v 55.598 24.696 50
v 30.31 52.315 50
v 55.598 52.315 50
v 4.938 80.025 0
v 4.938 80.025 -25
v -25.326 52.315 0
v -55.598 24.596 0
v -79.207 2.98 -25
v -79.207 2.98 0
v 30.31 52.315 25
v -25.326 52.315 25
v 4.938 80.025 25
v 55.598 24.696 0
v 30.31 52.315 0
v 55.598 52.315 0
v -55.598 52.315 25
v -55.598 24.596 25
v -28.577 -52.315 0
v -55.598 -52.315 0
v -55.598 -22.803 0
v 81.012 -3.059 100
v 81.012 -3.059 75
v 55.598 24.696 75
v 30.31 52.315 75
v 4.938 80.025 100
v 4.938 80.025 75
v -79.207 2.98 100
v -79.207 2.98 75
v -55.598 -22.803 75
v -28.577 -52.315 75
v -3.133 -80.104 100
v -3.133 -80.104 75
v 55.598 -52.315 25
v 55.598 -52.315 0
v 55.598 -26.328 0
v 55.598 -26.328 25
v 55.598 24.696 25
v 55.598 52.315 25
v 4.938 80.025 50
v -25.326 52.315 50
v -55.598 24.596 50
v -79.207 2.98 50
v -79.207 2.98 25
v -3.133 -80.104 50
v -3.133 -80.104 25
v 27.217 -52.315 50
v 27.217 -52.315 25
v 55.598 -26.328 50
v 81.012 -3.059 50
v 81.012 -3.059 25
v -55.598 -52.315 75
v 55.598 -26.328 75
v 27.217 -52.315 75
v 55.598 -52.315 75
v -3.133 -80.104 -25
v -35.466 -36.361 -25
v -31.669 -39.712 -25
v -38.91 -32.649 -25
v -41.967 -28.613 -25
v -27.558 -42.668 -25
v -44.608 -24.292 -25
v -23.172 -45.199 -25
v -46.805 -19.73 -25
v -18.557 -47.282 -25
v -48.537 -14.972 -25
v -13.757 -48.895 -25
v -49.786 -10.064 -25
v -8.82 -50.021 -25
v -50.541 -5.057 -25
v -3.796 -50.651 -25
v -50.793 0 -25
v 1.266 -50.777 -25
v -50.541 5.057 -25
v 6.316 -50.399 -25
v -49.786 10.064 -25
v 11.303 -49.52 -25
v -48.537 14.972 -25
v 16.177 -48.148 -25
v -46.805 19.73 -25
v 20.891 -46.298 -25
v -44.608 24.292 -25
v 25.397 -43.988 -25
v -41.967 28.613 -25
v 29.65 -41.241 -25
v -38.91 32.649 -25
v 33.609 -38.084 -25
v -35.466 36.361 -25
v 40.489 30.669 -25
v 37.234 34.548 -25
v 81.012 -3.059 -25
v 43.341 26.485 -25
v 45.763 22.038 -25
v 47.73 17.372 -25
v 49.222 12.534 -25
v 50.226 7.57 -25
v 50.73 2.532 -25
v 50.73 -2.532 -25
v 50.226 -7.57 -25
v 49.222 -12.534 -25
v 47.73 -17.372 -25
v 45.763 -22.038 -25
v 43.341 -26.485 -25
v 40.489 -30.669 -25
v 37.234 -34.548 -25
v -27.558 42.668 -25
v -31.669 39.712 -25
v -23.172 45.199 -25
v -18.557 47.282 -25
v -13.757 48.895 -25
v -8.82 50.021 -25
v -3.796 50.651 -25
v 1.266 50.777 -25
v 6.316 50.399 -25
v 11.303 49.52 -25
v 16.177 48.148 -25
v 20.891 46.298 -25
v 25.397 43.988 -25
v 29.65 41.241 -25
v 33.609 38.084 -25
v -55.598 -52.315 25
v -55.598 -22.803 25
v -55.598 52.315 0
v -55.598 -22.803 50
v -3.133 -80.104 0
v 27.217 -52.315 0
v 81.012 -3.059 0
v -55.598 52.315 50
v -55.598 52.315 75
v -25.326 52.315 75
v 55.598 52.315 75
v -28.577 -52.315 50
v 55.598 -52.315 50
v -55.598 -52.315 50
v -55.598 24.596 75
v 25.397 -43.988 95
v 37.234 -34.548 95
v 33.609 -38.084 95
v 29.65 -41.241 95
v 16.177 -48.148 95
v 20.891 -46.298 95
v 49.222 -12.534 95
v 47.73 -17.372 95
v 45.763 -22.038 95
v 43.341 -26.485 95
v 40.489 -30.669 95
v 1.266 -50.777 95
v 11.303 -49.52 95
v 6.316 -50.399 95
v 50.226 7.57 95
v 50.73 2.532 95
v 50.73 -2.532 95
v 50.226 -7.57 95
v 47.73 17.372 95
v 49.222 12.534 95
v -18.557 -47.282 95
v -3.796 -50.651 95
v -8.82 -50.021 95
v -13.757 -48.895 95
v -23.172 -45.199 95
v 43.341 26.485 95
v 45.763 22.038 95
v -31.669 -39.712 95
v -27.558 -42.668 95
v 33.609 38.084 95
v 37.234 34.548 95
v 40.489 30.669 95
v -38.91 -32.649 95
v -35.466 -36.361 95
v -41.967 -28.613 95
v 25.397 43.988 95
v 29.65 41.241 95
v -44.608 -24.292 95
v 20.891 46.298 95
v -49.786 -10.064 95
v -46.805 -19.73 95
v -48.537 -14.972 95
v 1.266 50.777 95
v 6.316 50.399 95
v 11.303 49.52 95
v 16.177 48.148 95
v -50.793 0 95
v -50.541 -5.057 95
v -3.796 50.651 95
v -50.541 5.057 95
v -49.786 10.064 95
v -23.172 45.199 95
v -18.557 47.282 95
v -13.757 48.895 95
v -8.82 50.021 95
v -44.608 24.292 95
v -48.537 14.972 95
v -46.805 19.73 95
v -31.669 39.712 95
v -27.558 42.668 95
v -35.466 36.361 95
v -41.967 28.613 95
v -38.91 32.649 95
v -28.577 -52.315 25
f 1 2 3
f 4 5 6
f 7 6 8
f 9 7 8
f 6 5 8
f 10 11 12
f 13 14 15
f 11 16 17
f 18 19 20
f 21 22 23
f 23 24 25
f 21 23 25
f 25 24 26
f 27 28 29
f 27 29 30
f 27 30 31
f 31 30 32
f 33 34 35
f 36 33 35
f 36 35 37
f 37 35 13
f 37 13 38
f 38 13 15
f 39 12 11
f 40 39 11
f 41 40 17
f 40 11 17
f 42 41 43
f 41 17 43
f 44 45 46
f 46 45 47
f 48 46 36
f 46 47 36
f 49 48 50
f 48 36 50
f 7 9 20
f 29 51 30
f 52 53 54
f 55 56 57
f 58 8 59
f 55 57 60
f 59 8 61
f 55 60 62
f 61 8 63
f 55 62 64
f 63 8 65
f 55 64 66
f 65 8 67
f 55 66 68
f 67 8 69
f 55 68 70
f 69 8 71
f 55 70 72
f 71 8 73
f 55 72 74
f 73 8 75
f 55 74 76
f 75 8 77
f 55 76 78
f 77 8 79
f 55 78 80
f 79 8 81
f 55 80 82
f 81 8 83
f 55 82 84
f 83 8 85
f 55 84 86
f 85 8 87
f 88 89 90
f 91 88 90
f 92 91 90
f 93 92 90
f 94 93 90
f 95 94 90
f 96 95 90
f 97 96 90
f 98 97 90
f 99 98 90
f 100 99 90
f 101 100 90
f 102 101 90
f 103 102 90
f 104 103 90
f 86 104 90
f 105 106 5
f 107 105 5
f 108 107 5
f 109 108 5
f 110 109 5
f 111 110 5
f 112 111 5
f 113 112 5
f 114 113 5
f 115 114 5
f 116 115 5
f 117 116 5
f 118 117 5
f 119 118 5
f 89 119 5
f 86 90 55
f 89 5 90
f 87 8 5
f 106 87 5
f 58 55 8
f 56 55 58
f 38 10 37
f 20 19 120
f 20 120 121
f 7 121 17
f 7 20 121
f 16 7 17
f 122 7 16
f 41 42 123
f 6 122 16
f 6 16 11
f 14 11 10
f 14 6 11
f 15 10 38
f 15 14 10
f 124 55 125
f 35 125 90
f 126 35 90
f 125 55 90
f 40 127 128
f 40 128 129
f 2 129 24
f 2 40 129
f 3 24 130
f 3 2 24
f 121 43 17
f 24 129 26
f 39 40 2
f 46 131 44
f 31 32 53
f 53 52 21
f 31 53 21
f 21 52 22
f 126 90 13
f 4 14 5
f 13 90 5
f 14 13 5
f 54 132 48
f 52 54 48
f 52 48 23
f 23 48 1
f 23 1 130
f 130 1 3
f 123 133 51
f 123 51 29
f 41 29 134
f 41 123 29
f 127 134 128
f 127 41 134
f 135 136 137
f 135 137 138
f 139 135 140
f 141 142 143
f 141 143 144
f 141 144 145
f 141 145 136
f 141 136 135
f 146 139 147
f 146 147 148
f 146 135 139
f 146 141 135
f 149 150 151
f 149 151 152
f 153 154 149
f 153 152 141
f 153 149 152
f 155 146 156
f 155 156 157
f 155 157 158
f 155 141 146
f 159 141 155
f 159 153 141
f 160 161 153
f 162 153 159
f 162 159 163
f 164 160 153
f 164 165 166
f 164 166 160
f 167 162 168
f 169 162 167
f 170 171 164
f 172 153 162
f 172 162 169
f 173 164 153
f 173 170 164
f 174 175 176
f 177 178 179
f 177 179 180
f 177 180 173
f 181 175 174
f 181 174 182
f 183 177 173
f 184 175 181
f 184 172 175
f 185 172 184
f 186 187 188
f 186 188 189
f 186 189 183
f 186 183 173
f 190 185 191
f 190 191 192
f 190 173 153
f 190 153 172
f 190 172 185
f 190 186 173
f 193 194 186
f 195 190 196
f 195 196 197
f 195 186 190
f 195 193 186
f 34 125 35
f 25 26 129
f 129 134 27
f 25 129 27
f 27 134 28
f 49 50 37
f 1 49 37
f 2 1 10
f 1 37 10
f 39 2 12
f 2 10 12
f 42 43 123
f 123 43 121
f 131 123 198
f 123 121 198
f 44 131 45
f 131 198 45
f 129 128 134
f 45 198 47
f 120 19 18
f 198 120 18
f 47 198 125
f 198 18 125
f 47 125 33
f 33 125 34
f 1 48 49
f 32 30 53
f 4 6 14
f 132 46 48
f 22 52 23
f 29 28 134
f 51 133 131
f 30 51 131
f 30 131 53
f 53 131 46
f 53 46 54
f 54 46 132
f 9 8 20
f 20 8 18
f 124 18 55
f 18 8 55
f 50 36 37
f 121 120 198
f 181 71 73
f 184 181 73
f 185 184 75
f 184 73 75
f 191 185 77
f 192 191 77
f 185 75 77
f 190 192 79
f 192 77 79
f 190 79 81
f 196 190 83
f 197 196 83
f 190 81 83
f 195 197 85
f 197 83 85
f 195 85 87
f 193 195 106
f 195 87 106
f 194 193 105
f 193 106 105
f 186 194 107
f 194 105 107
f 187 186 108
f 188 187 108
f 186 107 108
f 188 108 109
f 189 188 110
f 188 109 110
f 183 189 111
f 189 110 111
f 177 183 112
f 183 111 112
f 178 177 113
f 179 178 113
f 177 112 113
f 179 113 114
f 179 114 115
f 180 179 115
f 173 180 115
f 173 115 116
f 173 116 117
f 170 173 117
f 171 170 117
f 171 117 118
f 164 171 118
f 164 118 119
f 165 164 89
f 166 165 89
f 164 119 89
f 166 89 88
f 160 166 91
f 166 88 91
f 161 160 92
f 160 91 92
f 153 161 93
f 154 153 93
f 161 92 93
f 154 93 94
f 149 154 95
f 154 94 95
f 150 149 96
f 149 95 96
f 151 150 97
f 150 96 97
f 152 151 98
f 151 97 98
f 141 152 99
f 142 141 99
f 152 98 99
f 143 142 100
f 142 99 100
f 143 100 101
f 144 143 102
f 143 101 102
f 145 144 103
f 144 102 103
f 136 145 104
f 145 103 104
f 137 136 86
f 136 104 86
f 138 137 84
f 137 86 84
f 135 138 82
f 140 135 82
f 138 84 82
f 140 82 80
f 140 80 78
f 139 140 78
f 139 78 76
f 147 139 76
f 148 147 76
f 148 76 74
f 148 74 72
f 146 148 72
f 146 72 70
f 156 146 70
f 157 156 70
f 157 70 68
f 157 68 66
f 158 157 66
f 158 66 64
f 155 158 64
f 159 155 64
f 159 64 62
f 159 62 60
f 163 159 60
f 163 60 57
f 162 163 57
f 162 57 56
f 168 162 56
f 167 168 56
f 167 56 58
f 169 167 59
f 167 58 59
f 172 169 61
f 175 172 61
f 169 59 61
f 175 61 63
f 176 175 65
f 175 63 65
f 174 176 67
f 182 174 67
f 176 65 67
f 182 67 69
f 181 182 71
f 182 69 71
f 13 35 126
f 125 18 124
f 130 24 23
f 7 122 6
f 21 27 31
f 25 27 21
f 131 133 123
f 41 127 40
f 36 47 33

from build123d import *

# Parameters (mm, degrees)
CROQUIS1_W              = 111.196890842
CROQUIS1_H              = 104.63014532
SALIENTE_EXTRUIR1_DEPTH = 25
SALIENTE_EXTRUIR2_DEPTH = 25
MATRIZL4_COUNT          = 2
MATRIZL4_PITCH          = 50
MATRIZL5_COUNT          = 2
MATRIZL5_PITCH          = 50
CROQUIS3_R              = 50.793115706
CORTAR_EXTRUIR4_DEPTH   = 120


with BuildPart() as part:
    # Croquis1 → Saliente-Extruir1 (new body)
    with BuildSketch(Plane.XY):
        Rectangle(CROQUIS1_W, CROQUIS1_H)
    saliente_extruir1 = extrude(amount=SALIENTE_EXTRUIR1_DEPTH)

    # Croquis2 → Saliente-Extruir2 (add)
    with BuildSketch(Plane.XY.offset(25)):
        Polygon((-3.132824134, -80.10377536), (81.011557784, -3.059075666), (4.937773514, 80.024920806), (-79.206608404, 2.980221112), align=None)
    saliente_extruir2 = extrude(amount=SALIENTE_EXTRUIR2_DEPTH)

    # MatrizL4: Saliente-Extruir1, Saliente-Extruir2 ×2
    with Locations(*[(0, 0, i * MATRIZL4_PITCH) for i in range(1, MATRIZL4_COUNT)]):
        add(saliente_extruir1)
        add(saliente_extruir2)

    # MatrizL5: Saliente-Extruir2 ×2
    with Locations(*[(0, 0, -i * MATRIZL5_PITCH) for i in range(1, MATRIZL5_COUNT)]):
        add(saliente_extruir2)

    # Croquis3 → Cortar-Extruir4 (cut)
    with BuildSketch(Plane(origin=(0, 0, -25), x_dir=(-1, 0, 0), z_dir=(0, 0, -1))):
        Circle(CROQUIS3_R)
    extrude(amount=-CORTAR_EXTRUIR4_DEPTH, mode=Mode.SUBTRACT)


solid = part.part
